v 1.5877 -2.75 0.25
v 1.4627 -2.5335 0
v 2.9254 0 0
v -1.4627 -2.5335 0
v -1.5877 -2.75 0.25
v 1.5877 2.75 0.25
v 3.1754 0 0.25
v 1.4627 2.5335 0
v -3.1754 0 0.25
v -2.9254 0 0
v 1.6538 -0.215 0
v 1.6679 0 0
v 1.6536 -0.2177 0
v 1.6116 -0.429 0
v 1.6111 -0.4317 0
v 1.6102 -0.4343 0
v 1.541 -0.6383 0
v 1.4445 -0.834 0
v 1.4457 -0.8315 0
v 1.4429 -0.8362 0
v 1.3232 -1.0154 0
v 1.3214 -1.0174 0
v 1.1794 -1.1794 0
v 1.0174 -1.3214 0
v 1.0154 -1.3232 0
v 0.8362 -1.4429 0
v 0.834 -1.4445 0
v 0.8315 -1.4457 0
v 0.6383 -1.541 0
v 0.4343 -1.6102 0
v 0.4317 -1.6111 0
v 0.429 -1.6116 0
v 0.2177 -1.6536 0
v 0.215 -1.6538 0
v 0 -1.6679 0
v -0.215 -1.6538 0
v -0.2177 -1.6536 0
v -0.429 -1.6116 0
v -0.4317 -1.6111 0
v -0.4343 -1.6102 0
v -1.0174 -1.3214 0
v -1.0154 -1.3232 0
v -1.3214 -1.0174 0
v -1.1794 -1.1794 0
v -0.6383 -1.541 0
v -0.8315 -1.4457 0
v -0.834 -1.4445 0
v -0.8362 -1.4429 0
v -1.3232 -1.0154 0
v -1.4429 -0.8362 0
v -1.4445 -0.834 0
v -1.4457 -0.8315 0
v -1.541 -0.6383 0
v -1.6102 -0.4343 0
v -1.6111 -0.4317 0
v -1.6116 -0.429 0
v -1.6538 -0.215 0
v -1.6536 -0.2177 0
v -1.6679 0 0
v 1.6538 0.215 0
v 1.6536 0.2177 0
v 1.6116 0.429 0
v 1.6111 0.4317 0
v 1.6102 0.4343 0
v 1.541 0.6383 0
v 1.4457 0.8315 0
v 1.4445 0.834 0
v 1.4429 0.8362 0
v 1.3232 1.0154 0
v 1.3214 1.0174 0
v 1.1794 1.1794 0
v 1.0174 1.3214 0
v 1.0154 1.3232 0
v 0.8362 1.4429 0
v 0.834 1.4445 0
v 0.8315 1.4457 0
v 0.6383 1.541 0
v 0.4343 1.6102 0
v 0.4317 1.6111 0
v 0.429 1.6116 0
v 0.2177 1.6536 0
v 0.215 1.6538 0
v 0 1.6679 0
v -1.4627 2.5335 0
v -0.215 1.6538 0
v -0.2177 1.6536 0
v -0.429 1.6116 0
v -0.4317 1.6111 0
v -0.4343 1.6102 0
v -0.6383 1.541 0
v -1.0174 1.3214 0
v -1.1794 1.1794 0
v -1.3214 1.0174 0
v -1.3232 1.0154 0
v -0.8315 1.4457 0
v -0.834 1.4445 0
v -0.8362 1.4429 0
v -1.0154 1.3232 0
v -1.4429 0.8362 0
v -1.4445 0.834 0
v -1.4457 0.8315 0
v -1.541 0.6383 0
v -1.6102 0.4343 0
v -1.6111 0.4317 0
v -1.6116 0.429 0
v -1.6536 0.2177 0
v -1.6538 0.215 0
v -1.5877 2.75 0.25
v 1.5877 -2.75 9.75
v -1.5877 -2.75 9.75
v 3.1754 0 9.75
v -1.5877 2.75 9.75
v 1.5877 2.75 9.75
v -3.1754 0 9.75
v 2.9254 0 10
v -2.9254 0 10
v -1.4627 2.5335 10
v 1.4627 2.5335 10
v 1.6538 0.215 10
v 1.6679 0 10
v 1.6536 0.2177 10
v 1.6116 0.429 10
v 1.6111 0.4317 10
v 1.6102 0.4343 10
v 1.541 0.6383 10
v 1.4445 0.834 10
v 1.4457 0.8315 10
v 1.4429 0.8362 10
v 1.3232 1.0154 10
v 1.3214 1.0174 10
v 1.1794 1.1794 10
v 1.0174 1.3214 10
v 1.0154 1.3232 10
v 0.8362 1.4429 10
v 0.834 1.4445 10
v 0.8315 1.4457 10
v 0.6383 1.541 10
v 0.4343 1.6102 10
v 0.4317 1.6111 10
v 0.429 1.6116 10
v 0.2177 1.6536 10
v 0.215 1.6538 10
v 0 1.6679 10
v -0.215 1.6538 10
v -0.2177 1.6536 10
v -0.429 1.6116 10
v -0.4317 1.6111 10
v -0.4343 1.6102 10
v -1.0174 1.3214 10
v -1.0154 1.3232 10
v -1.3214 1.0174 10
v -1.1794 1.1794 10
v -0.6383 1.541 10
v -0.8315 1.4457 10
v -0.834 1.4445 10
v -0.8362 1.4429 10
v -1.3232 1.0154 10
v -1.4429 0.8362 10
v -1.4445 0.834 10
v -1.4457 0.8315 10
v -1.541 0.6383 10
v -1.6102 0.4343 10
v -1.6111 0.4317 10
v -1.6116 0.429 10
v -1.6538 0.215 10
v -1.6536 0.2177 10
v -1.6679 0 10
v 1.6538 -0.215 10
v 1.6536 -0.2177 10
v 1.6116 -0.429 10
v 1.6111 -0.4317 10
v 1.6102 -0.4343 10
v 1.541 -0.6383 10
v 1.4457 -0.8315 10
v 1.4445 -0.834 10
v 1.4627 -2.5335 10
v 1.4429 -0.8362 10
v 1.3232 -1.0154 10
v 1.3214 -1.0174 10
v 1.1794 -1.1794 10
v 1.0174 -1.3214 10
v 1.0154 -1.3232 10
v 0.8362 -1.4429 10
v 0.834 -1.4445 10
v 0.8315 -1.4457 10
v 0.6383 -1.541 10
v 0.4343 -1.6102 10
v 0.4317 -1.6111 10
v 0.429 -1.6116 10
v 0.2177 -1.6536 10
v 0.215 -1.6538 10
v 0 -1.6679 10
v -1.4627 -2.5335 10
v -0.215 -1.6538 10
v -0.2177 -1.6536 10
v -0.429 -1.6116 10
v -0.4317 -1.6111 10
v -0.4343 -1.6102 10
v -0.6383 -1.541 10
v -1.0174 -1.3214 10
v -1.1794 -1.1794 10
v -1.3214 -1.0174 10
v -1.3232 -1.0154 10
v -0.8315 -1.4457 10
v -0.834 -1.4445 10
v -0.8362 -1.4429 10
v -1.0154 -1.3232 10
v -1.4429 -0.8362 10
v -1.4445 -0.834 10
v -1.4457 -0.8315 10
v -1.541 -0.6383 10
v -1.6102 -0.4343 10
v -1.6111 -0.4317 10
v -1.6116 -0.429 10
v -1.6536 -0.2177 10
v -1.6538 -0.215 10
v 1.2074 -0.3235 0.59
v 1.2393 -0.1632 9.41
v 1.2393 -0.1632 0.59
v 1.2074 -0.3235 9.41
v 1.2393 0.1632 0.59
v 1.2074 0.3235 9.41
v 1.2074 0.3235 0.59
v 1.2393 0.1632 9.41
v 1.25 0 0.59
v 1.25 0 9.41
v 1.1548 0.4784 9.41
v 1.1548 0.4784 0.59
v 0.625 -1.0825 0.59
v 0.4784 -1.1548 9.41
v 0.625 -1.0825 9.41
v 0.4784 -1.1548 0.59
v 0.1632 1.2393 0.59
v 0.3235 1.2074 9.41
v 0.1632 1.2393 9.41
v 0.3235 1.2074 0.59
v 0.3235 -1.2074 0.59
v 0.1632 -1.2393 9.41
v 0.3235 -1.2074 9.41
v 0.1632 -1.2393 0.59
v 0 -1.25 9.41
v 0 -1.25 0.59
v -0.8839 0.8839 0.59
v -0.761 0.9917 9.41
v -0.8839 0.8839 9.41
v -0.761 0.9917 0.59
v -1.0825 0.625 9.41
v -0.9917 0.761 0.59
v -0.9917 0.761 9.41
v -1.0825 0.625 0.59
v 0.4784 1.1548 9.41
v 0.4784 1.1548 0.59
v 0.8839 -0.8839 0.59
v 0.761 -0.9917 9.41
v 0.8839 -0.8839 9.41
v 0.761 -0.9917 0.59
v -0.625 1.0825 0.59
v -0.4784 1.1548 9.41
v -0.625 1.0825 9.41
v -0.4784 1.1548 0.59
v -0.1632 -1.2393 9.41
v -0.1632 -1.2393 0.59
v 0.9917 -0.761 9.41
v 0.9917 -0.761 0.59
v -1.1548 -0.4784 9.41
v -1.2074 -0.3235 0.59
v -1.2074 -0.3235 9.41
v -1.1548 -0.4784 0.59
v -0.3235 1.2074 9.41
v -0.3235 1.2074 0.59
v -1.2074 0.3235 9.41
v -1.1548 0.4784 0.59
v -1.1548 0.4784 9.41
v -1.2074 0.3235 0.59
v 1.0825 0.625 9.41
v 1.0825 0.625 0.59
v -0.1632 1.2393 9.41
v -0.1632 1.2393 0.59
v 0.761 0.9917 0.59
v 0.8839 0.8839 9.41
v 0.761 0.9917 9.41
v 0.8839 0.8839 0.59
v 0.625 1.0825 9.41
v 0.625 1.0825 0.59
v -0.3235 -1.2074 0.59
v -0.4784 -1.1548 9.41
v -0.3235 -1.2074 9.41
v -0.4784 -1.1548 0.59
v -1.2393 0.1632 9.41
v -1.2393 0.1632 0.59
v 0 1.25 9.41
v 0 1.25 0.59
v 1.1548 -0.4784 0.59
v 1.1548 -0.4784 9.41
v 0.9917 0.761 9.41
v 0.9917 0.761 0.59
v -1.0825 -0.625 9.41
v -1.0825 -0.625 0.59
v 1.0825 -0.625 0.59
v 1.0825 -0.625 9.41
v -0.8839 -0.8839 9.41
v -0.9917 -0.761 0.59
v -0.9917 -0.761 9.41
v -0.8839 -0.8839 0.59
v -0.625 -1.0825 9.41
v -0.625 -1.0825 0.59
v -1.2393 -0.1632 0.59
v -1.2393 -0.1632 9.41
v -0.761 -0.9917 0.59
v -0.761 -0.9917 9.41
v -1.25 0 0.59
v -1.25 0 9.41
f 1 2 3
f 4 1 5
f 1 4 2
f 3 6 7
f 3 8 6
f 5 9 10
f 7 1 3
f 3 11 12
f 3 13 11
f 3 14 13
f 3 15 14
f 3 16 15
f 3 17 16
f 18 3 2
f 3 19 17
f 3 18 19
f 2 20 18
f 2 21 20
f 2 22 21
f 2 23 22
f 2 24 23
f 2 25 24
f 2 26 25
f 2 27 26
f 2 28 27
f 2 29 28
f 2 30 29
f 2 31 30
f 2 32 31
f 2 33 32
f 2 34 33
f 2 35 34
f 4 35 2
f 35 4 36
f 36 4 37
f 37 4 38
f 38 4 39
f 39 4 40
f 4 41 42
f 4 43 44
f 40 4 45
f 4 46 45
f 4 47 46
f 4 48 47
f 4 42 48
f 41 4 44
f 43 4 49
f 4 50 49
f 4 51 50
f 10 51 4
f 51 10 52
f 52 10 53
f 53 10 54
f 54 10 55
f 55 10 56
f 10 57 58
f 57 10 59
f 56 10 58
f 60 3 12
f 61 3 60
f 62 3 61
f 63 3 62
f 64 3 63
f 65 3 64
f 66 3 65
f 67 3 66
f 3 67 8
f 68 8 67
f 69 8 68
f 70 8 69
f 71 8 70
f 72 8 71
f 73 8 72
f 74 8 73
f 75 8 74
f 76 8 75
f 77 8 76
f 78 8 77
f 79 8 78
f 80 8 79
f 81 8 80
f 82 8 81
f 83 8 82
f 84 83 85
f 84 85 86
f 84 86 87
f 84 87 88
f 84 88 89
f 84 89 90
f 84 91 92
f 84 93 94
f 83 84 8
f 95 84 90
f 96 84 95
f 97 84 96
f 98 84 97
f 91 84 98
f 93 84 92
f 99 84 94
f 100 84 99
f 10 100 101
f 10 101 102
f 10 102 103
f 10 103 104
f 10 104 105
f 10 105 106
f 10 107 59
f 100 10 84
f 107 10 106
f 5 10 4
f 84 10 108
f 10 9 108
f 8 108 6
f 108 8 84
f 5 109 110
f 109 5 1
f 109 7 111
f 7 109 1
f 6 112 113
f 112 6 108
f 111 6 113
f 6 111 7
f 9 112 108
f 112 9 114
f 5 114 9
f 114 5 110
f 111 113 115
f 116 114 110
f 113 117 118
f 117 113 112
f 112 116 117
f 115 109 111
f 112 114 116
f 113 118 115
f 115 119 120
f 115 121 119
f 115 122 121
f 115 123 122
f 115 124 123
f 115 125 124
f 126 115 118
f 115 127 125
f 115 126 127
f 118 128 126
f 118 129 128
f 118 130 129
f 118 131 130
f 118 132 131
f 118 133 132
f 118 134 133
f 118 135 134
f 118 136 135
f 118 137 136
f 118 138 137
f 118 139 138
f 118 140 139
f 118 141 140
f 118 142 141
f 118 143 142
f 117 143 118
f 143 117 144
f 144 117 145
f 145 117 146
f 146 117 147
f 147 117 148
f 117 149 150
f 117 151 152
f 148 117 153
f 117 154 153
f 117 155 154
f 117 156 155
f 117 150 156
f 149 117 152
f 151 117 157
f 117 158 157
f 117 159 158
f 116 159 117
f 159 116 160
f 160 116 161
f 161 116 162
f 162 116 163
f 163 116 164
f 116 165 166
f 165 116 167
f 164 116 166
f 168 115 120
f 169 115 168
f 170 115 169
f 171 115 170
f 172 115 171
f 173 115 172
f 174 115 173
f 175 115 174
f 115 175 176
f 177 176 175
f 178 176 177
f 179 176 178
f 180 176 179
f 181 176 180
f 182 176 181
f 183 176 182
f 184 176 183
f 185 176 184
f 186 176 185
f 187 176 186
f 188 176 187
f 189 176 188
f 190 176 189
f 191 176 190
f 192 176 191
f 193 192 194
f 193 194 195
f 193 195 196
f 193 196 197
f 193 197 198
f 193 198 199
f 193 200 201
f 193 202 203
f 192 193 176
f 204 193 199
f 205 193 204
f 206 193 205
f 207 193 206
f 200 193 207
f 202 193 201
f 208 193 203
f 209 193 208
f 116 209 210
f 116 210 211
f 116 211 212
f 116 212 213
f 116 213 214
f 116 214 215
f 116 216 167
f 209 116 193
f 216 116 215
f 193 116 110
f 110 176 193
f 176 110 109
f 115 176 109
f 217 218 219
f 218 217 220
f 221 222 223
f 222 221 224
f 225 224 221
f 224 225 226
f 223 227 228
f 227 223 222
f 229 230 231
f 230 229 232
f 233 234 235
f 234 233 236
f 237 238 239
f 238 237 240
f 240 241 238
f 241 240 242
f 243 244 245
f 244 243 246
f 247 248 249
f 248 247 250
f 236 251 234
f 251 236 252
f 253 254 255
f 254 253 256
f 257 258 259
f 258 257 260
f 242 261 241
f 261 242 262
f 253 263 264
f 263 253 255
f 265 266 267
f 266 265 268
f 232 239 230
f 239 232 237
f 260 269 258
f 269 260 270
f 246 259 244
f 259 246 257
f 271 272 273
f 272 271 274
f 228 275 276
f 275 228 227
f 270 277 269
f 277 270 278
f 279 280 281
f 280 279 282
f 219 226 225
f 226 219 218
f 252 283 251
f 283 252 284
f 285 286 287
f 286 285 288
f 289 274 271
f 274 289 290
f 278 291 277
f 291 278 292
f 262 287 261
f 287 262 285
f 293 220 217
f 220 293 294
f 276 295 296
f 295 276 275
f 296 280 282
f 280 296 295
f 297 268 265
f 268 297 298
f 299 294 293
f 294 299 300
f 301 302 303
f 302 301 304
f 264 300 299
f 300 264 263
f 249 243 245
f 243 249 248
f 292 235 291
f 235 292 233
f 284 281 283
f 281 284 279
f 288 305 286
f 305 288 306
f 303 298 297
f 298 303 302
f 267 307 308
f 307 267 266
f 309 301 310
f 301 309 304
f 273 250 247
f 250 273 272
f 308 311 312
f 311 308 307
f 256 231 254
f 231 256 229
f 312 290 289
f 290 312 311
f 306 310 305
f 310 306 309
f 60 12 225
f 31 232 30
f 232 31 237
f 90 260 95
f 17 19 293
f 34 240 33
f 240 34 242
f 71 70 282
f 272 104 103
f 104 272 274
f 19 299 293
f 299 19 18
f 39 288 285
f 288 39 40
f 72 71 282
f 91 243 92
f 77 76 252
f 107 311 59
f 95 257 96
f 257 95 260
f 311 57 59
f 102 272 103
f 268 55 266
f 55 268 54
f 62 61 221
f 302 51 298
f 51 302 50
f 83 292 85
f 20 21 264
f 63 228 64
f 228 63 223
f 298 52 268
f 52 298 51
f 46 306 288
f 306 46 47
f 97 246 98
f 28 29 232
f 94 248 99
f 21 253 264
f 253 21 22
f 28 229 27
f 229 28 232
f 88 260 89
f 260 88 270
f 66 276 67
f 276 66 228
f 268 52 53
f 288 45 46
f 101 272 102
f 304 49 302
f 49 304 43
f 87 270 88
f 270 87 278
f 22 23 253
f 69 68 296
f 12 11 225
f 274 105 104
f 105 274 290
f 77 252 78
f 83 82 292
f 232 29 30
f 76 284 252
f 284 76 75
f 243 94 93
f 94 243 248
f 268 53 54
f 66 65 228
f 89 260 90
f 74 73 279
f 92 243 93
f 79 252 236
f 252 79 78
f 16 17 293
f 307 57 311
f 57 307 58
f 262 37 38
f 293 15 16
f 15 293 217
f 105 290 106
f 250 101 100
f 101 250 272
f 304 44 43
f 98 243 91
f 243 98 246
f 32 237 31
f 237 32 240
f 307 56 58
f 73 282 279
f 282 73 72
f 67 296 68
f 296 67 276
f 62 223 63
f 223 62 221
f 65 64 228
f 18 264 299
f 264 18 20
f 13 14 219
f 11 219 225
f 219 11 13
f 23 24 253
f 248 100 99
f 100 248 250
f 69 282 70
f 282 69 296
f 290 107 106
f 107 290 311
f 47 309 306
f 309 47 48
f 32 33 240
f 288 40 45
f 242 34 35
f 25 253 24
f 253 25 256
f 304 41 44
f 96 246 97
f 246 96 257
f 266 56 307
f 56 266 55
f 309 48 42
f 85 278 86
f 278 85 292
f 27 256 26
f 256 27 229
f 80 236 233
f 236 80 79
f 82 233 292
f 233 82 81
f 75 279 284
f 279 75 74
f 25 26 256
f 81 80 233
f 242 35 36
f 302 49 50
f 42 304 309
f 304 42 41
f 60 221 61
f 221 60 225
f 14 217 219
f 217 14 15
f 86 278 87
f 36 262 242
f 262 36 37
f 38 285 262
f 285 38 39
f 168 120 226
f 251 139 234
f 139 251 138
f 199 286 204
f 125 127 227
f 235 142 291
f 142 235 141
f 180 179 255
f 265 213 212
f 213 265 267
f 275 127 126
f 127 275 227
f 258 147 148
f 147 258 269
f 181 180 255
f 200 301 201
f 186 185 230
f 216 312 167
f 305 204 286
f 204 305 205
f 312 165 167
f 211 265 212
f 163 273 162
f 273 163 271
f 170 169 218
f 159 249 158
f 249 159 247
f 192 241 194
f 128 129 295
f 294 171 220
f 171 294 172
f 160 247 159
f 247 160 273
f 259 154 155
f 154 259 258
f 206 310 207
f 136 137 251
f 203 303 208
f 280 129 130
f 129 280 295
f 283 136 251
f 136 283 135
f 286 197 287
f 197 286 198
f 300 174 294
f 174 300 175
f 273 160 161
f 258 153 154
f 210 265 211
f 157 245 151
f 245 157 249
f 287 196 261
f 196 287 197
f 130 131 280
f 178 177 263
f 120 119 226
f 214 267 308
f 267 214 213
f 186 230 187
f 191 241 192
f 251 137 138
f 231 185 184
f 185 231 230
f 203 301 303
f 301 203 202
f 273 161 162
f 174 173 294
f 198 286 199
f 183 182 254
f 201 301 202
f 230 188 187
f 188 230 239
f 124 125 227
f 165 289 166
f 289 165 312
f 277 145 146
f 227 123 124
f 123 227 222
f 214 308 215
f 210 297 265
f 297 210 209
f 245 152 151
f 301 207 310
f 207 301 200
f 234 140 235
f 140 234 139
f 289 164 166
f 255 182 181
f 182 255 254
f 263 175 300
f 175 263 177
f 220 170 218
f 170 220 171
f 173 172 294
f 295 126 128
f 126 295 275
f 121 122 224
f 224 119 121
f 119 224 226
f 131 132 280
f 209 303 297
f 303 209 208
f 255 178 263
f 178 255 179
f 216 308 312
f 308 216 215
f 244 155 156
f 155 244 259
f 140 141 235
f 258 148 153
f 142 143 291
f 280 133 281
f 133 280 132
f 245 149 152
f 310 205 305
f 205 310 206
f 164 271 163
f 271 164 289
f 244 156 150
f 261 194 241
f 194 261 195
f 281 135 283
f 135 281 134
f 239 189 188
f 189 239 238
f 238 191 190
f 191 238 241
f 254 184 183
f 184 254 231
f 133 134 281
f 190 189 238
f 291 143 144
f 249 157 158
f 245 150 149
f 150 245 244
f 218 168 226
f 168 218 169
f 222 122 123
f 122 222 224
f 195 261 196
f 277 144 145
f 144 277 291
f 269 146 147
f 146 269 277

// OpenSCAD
// Parametric metric hex standoff: female thread at both ends.
// Dimensions are millimetres. Threads are represented by ISO coarse-thread
// major/core envelopes for fast, AI-readable catalog previews.

thread_diameter = is_undef(thread_diameter) ? 3.0 : thread_diameter;
thread_pitch = is_undef(thread_pitch) ? 0.5 : thread_pitch;
body_length = is_undef(body_length) ? 10.0 : body_length;
hex_width = is_undef(hex_width) ? 5.5 : hex_width;
female_depth = is_undef(female_depth) ? 6.0 : female_depth;
bevel = is_undef(bevel) ? 0.25 : bevel;

$fn = 48;

module hex_body(length, width, edge_bevel) {
    radius = width / sqrt(3);
    safe_bevel = min(edge_bevel, length / 4);
    union() {
        cylinder(h=safe_bevel, r1=radius - safe_bevel, r2=radius, $fn=6);
        translate([0, 0, safe_bevel])
            cylinder(h=length - 2 * safe_bevel, r=radius, $fn=6);
        translate([0, 0, length - safe_bevel])
            cylinder(h=safe_bevel, r1=radius, r2=radius - safe_bevel, $fn=6);
    }
}

module female_thread_envelope(depth, diameter, pitch) {
    core_diameter = max(0.2, diameter - pitch);
    union() {
        cylinder(h=depth + 0.02, d=core_diameter);
        cylinder(h=min(0.6, depth), d1=diameter + 0.35, d2=core_diameter);
    }
}

color([0.74, 0.76, 0.78])
difference() {
    hex_body(body_length, hex_width, bevel);
    translate([0, 0, -0.01])
        female_thread_envelope(min(female_depth, body_length), thread_diameter, thread_pitch);
    translate([0, 0, body_length + 0.01])
        rotate([180, 0, 0])
            female_thread_envelope(min(female_depth, body_length), thread_diameter, thread_pitch);
}
